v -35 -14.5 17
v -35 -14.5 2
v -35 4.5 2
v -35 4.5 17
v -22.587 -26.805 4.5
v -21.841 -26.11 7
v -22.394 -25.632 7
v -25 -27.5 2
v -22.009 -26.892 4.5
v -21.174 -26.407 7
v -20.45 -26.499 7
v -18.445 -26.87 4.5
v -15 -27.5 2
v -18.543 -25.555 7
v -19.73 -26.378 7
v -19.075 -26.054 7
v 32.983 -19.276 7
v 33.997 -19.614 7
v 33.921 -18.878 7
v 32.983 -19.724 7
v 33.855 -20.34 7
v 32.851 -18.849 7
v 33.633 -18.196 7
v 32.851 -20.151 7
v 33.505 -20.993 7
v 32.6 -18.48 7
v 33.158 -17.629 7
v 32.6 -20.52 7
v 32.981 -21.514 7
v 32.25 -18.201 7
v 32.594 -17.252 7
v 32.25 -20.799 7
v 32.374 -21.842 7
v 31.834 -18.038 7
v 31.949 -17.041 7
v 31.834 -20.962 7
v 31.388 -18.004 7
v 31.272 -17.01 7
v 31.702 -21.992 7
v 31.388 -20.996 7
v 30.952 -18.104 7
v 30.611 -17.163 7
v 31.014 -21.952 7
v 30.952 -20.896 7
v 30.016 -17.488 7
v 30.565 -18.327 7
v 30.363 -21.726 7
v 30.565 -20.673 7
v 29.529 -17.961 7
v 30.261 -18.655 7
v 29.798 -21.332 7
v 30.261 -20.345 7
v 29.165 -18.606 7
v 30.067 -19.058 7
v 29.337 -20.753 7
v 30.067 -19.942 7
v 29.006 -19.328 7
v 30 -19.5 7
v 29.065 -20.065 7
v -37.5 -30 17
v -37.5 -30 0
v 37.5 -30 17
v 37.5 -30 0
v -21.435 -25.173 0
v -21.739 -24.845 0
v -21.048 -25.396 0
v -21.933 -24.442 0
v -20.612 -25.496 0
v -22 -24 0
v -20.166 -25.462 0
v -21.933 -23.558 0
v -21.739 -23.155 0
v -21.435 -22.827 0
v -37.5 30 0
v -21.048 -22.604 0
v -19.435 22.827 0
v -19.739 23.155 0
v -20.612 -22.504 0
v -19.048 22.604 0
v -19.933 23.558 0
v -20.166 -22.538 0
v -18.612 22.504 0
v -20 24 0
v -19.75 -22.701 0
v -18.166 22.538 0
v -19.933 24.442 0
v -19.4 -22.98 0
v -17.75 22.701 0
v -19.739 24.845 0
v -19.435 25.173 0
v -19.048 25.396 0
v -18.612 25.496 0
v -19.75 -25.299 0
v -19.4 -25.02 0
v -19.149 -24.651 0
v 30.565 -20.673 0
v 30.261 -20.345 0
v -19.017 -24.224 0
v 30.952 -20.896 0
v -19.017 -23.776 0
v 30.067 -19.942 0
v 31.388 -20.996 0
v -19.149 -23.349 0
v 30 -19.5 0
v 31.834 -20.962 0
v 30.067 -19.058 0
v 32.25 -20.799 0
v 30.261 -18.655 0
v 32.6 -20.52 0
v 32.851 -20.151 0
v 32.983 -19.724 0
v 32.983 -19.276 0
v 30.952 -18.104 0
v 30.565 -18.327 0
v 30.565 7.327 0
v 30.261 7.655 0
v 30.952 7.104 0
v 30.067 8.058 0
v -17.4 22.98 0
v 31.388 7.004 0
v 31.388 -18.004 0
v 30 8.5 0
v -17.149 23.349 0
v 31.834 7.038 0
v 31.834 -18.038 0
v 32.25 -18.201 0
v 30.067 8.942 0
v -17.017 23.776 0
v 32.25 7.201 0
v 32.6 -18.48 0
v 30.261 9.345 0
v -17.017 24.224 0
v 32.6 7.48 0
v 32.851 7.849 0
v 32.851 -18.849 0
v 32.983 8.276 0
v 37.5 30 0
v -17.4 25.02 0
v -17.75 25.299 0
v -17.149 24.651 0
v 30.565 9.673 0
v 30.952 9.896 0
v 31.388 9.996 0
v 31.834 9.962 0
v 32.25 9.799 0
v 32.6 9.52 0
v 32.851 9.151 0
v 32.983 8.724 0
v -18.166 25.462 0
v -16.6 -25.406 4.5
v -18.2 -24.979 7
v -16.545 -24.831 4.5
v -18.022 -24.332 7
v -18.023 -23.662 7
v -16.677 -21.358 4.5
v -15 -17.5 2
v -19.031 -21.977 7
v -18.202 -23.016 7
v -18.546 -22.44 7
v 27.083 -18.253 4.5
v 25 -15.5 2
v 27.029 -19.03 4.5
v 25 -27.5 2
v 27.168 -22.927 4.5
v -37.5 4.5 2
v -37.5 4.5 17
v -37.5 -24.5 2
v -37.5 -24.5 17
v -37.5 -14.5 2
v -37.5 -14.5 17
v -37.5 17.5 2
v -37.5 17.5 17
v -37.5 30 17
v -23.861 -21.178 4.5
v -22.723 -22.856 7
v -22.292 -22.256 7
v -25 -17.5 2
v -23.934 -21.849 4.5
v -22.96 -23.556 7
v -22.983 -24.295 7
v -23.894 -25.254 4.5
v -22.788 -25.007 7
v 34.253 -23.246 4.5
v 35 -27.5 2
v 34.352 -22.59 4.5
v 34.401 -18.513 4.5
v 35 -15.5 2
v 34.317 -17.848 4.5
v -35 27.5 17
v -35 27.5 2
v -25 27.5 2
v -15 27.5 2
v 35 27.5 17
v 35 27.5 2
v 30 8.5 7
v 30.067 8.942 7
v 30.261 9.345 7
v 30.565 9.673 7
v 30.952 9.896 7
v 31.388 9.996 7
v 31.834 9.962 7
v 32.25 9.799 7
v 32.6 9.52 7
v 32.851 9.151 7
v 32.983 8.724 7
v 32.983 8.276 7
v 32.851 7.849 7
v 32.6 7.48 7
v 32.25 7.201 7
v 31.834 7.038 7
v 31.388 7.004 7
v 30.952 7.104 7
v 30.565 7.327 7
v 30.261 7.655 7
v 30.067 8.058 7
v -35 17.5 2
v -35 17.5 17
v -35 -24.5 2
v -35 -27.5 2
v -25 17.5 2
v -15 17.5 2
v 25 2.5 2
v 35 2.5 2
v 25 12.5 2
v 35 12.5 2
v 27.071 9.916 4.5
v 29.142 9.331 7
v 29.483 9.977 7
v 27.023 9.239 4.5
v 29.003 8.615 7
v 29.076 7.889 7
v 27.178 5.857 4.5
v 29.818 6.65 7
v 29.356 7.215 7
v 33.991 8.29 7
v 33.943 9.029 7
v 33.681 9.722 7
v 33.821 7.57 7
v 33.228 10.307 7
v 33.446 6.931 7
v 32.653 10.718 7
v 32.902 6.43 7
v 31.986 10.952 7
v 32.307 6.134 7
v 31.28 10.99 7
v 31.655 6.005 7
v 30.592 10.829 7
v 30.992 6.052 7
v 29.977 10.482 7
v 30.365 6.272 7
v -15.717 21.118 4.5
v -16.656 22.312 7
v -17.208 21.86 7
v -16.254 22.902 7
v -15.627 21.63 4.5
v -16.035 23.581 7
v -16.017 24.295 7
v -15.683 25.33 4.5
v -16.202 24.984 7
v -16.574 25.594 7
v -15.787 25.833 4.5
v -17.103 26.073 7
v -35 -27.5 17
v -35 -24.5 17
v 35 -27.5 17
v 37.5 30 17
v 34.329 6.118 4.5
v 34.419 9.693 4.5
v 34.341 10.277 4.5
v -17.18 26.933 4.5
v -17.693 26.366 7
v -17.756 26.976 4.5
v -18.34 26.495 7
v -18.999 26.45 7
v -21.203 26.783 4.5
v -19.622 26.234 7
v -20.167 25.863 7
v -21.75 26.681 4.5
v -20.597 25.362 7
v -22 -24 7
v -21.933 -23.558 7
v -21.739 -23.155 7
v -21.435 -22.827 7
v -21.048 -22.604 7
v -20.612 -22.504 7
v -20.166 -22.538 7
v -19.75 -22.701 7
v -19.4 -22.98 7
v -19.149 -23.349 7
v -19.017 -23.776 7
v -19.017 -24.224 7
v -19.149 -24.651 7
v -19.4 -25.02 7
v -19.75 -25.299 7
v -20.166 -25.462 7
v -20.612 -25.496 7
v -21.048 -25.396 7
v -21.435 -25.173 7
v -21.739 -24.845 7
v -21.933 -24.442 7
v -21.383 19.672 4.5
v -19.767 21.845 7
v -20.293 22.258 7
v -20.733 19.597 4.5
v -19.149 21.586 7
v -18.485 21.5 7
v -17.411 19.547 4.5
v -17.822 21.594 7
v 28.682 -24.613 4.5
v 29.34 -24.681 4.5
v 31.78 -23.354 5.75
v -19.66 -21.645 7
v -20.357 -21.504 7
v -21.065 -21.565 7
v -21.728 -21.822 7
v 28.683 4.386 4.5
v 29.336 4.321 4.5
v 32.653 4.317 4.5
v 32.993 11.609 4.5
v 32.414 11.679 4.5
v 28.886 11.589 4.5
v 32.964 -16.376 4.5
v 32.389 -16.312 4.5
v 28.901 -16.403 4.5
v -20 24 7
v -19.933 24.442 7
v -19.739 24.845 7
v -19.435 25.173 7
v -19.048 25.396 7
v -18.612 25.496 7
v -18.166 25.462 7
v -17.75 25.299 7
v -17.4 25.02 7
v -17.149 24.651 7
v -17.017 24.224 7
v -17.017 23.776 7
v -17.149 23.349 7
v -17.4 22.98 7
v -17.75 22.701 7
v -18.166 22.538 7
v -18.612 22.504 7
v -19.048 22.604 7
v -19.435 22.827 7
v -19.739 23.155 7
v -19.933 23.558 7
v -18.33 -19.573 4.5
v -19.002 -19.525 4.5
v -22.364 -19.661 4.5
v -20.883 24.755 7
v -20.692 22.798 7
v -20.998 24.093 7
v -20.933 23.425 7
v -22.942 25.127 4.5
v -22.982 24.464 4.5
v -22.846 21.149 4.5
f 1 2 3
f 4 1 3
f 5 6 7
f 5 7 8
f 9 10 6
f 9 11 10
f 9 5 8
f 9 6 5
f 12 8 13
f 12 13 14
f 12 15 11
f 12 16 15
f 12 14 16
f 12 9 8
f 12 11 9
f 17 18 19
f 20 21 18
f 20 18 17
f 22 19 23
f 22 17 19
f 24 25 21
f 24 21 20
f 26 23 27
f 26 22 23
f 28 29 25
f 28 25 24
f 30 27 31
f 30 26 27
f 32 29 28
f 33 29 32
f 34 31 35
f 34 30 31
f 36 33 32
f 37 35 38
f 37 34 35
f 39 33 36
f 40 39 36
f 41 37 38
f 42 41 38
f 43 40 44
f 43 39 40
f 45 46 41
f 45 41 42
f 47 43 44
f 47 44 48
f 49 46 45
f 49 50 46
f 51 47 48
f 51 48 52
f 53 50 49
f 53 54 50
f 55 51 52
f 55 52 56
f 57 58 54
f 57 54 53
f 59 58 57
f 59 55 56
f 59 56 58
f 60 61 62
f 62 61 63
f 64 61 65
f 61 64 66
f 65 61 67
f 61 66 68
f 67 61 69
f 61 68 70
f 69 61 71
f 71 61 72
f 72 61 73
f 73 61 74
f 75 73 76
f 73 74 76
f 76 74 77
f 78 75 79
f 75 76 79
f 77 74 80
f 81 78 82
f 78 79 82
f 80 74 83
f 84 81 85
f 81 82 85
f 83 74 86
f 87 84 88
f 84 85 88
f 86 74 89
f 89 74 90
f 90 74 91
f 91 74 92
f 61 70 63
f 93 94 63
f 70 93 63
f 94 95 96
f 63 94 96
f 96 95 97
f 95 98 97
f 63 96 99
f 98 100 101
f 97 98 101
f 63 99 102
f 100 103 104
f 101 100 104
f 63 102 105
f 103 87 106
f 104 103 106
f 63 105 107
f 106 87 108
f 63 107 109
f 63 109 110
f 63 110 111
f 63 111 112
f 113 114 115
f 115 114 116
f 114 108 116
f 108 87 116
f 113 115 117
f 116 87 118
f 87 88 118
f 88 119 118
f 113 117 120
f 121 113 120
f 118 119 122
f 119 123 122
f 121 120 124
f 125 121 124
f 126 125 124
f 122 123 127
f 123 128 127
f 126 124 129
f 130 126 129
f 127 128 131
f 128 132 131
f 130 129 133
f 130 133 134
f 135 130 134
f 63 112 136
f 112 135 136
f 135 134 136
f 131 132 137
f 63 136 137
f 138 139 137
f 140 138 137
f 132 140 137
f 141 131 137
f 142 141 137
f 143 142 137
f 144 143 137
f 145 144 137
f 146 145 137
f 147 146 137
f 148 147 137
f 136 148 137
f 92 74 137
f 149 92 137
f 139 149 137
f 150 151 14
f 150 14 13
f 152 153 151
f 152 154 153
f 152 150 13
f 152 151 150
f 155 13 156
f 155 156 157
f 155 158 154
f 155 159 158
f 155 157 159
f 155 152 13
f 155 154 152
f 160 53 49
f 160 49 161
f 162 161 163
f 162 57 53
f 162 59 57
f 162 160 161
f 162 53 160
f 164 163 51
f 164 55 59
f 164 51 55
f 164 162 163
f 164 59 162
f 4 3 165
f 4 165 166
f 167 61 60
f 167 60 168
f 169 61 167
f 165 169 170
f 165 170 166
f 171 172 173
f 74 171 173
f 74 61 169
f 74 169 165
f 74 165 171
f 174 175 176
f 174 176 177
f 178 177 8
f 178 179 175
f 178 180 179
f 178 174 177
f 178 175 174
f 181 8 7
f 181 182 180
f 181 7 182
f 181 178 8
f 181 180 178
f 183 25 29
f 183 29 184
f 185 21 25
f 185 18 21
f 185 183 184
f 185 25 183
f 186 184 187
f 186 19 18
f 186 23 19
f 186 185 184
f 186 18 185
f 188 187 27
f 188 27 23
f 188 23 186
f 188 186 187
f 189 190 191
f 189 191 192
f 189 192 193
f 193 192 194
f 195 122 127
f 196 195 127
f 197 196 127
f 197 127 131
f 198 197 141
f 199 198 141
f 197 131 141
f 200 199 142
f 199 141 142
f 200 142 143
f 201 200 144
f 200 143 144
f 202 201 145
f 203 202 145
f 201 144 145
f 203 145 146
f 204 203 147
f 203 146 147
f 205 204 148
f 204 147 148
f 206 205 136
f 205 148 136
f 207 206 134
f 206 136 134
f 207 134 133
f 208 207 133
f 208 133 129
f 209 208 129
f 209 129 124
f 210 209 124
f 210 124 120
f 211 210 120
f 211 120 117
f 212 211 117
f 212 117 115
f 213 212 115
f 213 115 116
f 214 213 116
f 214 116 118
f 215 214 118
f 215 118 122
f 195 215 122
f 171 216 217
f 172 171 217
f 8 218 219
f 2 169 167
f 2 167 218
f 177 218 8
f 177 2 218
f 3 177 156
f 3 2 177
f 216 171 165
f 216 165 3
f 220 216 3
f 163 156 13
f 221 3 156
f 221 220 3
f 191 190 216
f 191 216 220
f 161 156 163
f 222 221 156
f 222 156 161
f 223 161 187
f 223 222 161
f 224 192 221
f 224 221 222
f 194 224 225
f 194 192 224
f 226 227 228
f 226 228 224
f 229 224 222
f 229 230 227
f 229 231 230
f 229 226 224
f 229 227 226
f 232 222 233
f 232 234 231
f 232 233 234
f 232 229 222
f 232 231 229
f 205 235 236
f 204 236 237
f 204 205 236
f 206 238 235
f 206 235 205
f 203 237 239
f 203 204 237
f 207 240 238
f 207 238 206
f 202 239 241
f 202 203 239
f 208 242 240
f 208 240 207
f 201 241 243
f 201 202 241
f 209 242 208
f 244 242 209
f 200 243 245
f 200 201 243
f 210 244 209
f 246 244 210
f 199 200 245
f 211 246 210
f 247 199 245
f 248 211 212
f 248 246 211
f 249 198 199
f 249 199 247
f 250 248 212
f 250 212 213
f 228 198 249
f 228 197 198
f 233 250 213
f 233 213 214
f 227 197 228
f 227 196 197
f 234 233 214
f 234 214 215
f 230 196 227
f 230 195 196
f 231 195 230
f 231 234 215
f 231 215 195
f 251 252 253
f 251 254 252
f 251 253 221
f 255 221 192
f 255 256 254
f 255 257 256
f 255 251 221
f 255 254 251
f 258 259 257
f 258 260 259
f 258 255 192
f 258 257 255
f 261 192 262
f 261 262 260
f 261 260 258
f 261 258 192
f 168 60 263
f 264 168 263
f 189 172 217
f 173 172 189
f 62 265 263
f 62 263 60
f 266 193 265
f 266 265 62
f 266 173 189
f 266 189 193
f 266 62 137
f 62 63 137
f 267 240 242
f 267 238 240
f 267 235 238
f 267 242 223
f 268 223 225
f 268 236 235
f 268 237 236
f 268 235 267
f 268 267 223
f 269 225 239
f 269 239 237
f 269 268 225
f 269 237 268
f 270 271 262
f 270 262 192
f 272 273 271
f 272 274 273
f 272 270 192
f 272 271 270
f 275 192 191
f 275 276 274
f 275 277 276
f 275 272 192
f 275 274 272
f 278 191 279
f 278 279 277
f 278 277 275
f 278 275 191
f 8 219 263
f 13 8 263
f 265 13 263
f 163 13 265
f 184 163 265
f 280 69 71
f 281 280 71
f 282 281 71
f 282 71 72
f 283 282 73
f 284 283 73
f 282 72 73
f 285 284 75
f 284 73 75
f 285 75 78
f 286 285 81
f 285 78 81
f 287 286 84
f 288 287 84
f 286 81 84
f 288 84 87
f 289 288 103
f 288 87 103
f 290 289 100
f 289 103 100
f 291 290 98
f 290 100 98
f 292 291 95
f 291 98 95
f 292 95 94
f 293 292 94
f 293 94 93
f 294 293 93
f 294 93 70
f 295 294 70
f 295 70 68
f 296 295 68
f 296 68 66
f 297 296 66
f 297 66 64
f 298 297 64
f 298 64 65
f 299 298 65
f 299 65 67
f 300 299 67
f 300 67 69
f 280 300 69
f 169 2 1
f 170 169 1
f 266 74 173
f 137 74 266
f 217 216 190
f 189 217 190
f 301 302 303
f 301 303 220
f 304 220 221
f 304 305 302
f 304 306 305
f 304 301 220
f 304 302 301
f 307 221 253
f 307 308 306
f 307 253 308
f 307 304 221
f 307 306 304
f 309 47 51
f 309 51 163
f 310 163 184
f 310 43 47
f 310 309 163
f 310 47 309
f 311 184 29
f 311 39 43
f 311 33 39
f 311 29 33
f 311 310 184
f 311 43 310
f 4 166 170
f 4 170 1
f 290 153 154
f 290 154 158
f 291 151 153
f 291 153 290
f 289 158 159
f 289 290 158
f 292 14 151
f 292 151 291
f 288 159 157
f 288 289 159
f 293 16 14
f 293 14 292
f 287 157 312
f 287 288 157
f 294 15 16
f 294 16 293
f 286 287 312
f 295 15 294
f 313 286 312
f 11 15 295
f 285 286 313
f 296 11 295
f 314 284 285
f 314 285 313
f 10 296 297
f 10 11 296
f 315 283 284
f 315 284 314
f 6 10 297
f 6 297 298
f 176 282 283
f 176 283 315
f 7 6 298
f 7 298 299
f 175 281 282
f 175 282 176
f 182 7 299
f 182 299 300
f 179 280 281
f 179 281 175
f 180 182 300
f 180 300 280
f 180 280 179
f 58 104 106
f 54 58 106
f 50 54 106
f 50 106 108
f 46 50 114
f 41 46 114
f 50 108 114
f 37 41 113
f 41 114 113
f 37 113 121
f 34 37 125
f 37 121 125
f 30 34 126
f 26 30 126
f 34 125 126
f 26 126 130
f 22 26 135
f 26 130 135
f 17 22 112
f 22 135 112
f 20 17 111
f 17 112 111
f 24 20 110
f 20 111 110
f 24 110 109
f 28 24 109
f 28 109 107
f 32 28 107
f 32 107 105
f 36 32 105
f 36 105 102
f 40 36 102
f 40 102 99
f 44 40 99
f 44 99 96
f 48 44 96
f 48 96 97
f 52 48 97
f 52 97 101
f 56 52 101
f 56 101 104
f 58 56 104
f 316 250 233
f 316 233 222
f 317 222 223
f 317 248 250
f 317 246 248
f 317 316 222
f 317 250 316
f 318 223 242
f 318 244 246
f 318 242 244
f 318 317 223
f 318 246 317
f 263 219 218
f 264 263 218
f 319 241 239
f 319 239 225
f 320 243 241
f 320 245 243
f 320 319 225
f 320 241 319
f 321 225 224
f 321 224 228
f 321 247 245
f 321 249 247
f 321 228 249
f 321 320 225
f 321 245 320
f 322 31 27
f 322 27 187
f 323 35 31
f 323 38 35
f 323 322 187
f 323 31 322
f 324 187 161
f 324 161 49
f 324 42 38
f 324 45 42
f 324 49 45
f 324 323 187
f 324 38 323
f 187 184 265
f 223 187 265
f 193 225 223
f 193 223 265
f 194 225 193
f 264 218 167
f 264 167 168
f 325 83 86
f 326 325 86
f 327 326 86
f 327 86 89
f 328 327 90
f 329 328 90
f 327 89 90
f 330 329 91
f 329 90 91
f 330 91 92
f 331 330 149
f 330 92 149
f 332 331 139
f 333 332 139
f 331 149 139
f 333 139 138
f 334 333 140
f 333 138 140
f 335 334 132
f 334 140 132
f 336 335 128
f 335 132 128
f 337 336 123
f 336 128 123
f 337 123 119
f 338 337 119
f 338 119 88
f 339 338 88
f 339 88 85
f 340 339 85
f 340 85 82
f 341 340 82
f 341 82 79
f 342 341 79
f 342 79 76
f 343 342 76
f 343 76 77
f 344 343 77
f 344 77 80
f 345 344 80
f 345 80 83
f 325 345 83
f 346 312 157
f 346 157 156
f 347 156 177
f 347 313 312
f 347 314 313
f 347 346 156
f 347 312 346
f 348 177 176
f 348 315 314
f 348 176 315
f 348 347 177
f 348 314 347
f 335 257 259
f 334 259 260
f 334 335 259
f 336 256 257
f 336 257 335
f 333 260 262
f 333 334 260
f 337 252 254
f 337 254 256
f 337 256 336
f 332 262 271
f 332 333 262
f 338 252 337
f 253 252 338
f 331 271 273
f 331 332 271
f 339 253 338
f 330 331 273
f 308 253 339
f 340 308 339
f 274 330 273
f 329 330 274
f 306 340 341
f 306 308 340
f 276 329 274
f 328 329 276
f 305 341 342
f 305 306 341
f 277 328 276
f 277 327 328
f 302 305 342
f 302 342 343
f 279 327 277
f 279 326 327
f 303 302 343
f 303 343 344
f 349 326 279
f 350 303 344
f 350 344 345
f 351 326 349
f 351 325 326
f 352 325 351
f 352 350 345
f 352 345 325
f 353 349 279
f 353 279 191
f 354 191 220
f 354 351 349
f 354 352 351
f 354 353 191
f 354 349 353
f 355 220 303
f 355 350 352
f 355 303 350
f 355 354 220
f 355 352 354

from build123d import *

# Parameters (mm, degrees)
F0_W      = 75
F0_H      = 60
F1_DEPTH  = 2
F2_W      = 75
F2_H      = 60
F2_W_2    = 70
F2_H_2    = 55
F3_DEPTH  = 15
F4_W      = 10
F4_H      = 10
F4_H_2    = 12
F11_D     = 3
F12_W     = 10
F12_H     = 15
F12_W_2   = 13
F13_DEPTH = 2.5


with BuildPart() as f1:
    # F0 (on Top) → F1 (new body)
    with BuildSketch(Plane.XY):
        Rectangle(F0_W, F0_H)
    extrude(amount=F1_DEPTH)

    # F2 (on face) → F3 (join)
    with BuildSketch(Plane.XY.offset(2)):
        Rectangle(F2_W, F2_H)
        Rectangle(F2_W_2, F2_H_2, mode=Mode.SUBTRACT)
    extrude(amount=F3_DEPTH)

    # F4 (on face) → F7 section 0
    with BuildSketch(Plane.XY.offset(2)):
        with Locations((-20, 22.5)):
            Rectangle(F4_W, F4_H)
    # F6 (on offset) → F7 section 1
    with BuildSketch(Plane.XY.offset(7)):
        with BuildLine():
            ThreePointArc((-20.293224, 22.258062), (-18.819991, 21.520563), (-17.207788, 21.859863))
            ThreePointArc((-17.207788, 21.859863), (-16.000779, 23.937586), (-17.102572, 26.072968))
            ThreePointArc((-17.102572, 26.072968), (-18.99862, 26.449771), (-20.596534, 25.361817))
            ThreePointArc((-20.596534, 25.361817), (-20.988147, 23.756849), (-20.293224, 22.258062))
        make_face()
    loft()

    # F4 (on face) → F8 section 0
    with BuildSketch(Plane.XY.offset(2)):
        with Locations((30, 7.5)):
            Rectangle(F4_W, F4_H)
    # F6 (on offset) → F8 section 1
    with BuildSketch(Plane.XY.offset(7)):
        with BuildLine():
            ThreePointArc((29.818347, 6.650123), (31.321839, 6.006356), (32.901582, 6.429838))
            ThreePointArc((32.901582, 6.429838), (33.991199, 8.290416), (33.227758, 10.306891))
            ThreePointArc((33.227758, 10.306891), (31.280438, 10.99034), (29.482742, 9.976709))
            ThreePointArc((29.482742, 9.976709), (29.012626, 8.249059), (29.818347, 6.650123))
        make_face()
    loft()

    # F4 (on face) → F9 section 0
    with BuildSketch(Plane.XY.offset(2)):
        with Locations((30, -21.5)):
            Rectangle(F4_W, F4_H_2)
    # F6 (on offset) → F9 section 1
    with BuildSketch(Plane.XY.offset(7)):
        with BuildLine():
            ThreePointArc((29.529474, -17.961486), (29.007923, -19.698875), (29.798415, -21.331559))
            ThreePointArc((29.798415, -21.331559), (31.356554, -21.995881), (32.980542, -21.514447))
            ThreePointArc((32.980542, -21.514447), (33.997404, -19.613892), (33.157749, -17.628672))
            ThreePointArc((33.157749, -17.628672), (31.271639, -17.010452), (29.529474, -17.961486))
        make_face()
    loft()

    # F4 (on face) → F10 section 0
    with BuildSketch(Plane.XY.offset(2)):
        with Locations((-20, -22.5)):
            Rectangle(F4_W, F4_H)
    # F6 (on offset) → F10 section 1
    with BuildSketch(Plane.XY.offset(7)):
        with BuildLine():
            ThreePointArc((-19.030994, -21.977126), (-20.71328, -21.509114), (-22.291516, -22.256305))
            ThreePointArc((-22.291516, -22.256305), (-22.998858, -23.92446), (-22.393571, -25.632296))
            ThreePointArc((-22.393571, -25.632296), (-20.449964, -26.499499), (-18.54262, -25.555205))
            ThreePointArc((-18.54262, -25.555205), (-18.022967, -23.661909), (-19.030994, -21.977126))
        make_face()
    loft()

    # F11 (through all)
    with Locations(Plane.XY.offset(7)):
        with Locations((-18.5, 24), (31.5, 8.5), (31.5, -19.5), (-20.5, -24)):
            Hole(F11_D / 2)

    # F12 (on face) → F13 (cut, through all)
    with BuildSketch(Plane.YZ.offset(-35)):
        with Locations((-19.5, 9.5)):
            Rectangle(F12_W, F12_H)
        with Locations((11, 9.5)):
            Rectangle(F12_W_2, F12_H)
    extrude(amount=-F13_DEPTH, mode=Mode.SUBTRACT)


solid = f1.part
